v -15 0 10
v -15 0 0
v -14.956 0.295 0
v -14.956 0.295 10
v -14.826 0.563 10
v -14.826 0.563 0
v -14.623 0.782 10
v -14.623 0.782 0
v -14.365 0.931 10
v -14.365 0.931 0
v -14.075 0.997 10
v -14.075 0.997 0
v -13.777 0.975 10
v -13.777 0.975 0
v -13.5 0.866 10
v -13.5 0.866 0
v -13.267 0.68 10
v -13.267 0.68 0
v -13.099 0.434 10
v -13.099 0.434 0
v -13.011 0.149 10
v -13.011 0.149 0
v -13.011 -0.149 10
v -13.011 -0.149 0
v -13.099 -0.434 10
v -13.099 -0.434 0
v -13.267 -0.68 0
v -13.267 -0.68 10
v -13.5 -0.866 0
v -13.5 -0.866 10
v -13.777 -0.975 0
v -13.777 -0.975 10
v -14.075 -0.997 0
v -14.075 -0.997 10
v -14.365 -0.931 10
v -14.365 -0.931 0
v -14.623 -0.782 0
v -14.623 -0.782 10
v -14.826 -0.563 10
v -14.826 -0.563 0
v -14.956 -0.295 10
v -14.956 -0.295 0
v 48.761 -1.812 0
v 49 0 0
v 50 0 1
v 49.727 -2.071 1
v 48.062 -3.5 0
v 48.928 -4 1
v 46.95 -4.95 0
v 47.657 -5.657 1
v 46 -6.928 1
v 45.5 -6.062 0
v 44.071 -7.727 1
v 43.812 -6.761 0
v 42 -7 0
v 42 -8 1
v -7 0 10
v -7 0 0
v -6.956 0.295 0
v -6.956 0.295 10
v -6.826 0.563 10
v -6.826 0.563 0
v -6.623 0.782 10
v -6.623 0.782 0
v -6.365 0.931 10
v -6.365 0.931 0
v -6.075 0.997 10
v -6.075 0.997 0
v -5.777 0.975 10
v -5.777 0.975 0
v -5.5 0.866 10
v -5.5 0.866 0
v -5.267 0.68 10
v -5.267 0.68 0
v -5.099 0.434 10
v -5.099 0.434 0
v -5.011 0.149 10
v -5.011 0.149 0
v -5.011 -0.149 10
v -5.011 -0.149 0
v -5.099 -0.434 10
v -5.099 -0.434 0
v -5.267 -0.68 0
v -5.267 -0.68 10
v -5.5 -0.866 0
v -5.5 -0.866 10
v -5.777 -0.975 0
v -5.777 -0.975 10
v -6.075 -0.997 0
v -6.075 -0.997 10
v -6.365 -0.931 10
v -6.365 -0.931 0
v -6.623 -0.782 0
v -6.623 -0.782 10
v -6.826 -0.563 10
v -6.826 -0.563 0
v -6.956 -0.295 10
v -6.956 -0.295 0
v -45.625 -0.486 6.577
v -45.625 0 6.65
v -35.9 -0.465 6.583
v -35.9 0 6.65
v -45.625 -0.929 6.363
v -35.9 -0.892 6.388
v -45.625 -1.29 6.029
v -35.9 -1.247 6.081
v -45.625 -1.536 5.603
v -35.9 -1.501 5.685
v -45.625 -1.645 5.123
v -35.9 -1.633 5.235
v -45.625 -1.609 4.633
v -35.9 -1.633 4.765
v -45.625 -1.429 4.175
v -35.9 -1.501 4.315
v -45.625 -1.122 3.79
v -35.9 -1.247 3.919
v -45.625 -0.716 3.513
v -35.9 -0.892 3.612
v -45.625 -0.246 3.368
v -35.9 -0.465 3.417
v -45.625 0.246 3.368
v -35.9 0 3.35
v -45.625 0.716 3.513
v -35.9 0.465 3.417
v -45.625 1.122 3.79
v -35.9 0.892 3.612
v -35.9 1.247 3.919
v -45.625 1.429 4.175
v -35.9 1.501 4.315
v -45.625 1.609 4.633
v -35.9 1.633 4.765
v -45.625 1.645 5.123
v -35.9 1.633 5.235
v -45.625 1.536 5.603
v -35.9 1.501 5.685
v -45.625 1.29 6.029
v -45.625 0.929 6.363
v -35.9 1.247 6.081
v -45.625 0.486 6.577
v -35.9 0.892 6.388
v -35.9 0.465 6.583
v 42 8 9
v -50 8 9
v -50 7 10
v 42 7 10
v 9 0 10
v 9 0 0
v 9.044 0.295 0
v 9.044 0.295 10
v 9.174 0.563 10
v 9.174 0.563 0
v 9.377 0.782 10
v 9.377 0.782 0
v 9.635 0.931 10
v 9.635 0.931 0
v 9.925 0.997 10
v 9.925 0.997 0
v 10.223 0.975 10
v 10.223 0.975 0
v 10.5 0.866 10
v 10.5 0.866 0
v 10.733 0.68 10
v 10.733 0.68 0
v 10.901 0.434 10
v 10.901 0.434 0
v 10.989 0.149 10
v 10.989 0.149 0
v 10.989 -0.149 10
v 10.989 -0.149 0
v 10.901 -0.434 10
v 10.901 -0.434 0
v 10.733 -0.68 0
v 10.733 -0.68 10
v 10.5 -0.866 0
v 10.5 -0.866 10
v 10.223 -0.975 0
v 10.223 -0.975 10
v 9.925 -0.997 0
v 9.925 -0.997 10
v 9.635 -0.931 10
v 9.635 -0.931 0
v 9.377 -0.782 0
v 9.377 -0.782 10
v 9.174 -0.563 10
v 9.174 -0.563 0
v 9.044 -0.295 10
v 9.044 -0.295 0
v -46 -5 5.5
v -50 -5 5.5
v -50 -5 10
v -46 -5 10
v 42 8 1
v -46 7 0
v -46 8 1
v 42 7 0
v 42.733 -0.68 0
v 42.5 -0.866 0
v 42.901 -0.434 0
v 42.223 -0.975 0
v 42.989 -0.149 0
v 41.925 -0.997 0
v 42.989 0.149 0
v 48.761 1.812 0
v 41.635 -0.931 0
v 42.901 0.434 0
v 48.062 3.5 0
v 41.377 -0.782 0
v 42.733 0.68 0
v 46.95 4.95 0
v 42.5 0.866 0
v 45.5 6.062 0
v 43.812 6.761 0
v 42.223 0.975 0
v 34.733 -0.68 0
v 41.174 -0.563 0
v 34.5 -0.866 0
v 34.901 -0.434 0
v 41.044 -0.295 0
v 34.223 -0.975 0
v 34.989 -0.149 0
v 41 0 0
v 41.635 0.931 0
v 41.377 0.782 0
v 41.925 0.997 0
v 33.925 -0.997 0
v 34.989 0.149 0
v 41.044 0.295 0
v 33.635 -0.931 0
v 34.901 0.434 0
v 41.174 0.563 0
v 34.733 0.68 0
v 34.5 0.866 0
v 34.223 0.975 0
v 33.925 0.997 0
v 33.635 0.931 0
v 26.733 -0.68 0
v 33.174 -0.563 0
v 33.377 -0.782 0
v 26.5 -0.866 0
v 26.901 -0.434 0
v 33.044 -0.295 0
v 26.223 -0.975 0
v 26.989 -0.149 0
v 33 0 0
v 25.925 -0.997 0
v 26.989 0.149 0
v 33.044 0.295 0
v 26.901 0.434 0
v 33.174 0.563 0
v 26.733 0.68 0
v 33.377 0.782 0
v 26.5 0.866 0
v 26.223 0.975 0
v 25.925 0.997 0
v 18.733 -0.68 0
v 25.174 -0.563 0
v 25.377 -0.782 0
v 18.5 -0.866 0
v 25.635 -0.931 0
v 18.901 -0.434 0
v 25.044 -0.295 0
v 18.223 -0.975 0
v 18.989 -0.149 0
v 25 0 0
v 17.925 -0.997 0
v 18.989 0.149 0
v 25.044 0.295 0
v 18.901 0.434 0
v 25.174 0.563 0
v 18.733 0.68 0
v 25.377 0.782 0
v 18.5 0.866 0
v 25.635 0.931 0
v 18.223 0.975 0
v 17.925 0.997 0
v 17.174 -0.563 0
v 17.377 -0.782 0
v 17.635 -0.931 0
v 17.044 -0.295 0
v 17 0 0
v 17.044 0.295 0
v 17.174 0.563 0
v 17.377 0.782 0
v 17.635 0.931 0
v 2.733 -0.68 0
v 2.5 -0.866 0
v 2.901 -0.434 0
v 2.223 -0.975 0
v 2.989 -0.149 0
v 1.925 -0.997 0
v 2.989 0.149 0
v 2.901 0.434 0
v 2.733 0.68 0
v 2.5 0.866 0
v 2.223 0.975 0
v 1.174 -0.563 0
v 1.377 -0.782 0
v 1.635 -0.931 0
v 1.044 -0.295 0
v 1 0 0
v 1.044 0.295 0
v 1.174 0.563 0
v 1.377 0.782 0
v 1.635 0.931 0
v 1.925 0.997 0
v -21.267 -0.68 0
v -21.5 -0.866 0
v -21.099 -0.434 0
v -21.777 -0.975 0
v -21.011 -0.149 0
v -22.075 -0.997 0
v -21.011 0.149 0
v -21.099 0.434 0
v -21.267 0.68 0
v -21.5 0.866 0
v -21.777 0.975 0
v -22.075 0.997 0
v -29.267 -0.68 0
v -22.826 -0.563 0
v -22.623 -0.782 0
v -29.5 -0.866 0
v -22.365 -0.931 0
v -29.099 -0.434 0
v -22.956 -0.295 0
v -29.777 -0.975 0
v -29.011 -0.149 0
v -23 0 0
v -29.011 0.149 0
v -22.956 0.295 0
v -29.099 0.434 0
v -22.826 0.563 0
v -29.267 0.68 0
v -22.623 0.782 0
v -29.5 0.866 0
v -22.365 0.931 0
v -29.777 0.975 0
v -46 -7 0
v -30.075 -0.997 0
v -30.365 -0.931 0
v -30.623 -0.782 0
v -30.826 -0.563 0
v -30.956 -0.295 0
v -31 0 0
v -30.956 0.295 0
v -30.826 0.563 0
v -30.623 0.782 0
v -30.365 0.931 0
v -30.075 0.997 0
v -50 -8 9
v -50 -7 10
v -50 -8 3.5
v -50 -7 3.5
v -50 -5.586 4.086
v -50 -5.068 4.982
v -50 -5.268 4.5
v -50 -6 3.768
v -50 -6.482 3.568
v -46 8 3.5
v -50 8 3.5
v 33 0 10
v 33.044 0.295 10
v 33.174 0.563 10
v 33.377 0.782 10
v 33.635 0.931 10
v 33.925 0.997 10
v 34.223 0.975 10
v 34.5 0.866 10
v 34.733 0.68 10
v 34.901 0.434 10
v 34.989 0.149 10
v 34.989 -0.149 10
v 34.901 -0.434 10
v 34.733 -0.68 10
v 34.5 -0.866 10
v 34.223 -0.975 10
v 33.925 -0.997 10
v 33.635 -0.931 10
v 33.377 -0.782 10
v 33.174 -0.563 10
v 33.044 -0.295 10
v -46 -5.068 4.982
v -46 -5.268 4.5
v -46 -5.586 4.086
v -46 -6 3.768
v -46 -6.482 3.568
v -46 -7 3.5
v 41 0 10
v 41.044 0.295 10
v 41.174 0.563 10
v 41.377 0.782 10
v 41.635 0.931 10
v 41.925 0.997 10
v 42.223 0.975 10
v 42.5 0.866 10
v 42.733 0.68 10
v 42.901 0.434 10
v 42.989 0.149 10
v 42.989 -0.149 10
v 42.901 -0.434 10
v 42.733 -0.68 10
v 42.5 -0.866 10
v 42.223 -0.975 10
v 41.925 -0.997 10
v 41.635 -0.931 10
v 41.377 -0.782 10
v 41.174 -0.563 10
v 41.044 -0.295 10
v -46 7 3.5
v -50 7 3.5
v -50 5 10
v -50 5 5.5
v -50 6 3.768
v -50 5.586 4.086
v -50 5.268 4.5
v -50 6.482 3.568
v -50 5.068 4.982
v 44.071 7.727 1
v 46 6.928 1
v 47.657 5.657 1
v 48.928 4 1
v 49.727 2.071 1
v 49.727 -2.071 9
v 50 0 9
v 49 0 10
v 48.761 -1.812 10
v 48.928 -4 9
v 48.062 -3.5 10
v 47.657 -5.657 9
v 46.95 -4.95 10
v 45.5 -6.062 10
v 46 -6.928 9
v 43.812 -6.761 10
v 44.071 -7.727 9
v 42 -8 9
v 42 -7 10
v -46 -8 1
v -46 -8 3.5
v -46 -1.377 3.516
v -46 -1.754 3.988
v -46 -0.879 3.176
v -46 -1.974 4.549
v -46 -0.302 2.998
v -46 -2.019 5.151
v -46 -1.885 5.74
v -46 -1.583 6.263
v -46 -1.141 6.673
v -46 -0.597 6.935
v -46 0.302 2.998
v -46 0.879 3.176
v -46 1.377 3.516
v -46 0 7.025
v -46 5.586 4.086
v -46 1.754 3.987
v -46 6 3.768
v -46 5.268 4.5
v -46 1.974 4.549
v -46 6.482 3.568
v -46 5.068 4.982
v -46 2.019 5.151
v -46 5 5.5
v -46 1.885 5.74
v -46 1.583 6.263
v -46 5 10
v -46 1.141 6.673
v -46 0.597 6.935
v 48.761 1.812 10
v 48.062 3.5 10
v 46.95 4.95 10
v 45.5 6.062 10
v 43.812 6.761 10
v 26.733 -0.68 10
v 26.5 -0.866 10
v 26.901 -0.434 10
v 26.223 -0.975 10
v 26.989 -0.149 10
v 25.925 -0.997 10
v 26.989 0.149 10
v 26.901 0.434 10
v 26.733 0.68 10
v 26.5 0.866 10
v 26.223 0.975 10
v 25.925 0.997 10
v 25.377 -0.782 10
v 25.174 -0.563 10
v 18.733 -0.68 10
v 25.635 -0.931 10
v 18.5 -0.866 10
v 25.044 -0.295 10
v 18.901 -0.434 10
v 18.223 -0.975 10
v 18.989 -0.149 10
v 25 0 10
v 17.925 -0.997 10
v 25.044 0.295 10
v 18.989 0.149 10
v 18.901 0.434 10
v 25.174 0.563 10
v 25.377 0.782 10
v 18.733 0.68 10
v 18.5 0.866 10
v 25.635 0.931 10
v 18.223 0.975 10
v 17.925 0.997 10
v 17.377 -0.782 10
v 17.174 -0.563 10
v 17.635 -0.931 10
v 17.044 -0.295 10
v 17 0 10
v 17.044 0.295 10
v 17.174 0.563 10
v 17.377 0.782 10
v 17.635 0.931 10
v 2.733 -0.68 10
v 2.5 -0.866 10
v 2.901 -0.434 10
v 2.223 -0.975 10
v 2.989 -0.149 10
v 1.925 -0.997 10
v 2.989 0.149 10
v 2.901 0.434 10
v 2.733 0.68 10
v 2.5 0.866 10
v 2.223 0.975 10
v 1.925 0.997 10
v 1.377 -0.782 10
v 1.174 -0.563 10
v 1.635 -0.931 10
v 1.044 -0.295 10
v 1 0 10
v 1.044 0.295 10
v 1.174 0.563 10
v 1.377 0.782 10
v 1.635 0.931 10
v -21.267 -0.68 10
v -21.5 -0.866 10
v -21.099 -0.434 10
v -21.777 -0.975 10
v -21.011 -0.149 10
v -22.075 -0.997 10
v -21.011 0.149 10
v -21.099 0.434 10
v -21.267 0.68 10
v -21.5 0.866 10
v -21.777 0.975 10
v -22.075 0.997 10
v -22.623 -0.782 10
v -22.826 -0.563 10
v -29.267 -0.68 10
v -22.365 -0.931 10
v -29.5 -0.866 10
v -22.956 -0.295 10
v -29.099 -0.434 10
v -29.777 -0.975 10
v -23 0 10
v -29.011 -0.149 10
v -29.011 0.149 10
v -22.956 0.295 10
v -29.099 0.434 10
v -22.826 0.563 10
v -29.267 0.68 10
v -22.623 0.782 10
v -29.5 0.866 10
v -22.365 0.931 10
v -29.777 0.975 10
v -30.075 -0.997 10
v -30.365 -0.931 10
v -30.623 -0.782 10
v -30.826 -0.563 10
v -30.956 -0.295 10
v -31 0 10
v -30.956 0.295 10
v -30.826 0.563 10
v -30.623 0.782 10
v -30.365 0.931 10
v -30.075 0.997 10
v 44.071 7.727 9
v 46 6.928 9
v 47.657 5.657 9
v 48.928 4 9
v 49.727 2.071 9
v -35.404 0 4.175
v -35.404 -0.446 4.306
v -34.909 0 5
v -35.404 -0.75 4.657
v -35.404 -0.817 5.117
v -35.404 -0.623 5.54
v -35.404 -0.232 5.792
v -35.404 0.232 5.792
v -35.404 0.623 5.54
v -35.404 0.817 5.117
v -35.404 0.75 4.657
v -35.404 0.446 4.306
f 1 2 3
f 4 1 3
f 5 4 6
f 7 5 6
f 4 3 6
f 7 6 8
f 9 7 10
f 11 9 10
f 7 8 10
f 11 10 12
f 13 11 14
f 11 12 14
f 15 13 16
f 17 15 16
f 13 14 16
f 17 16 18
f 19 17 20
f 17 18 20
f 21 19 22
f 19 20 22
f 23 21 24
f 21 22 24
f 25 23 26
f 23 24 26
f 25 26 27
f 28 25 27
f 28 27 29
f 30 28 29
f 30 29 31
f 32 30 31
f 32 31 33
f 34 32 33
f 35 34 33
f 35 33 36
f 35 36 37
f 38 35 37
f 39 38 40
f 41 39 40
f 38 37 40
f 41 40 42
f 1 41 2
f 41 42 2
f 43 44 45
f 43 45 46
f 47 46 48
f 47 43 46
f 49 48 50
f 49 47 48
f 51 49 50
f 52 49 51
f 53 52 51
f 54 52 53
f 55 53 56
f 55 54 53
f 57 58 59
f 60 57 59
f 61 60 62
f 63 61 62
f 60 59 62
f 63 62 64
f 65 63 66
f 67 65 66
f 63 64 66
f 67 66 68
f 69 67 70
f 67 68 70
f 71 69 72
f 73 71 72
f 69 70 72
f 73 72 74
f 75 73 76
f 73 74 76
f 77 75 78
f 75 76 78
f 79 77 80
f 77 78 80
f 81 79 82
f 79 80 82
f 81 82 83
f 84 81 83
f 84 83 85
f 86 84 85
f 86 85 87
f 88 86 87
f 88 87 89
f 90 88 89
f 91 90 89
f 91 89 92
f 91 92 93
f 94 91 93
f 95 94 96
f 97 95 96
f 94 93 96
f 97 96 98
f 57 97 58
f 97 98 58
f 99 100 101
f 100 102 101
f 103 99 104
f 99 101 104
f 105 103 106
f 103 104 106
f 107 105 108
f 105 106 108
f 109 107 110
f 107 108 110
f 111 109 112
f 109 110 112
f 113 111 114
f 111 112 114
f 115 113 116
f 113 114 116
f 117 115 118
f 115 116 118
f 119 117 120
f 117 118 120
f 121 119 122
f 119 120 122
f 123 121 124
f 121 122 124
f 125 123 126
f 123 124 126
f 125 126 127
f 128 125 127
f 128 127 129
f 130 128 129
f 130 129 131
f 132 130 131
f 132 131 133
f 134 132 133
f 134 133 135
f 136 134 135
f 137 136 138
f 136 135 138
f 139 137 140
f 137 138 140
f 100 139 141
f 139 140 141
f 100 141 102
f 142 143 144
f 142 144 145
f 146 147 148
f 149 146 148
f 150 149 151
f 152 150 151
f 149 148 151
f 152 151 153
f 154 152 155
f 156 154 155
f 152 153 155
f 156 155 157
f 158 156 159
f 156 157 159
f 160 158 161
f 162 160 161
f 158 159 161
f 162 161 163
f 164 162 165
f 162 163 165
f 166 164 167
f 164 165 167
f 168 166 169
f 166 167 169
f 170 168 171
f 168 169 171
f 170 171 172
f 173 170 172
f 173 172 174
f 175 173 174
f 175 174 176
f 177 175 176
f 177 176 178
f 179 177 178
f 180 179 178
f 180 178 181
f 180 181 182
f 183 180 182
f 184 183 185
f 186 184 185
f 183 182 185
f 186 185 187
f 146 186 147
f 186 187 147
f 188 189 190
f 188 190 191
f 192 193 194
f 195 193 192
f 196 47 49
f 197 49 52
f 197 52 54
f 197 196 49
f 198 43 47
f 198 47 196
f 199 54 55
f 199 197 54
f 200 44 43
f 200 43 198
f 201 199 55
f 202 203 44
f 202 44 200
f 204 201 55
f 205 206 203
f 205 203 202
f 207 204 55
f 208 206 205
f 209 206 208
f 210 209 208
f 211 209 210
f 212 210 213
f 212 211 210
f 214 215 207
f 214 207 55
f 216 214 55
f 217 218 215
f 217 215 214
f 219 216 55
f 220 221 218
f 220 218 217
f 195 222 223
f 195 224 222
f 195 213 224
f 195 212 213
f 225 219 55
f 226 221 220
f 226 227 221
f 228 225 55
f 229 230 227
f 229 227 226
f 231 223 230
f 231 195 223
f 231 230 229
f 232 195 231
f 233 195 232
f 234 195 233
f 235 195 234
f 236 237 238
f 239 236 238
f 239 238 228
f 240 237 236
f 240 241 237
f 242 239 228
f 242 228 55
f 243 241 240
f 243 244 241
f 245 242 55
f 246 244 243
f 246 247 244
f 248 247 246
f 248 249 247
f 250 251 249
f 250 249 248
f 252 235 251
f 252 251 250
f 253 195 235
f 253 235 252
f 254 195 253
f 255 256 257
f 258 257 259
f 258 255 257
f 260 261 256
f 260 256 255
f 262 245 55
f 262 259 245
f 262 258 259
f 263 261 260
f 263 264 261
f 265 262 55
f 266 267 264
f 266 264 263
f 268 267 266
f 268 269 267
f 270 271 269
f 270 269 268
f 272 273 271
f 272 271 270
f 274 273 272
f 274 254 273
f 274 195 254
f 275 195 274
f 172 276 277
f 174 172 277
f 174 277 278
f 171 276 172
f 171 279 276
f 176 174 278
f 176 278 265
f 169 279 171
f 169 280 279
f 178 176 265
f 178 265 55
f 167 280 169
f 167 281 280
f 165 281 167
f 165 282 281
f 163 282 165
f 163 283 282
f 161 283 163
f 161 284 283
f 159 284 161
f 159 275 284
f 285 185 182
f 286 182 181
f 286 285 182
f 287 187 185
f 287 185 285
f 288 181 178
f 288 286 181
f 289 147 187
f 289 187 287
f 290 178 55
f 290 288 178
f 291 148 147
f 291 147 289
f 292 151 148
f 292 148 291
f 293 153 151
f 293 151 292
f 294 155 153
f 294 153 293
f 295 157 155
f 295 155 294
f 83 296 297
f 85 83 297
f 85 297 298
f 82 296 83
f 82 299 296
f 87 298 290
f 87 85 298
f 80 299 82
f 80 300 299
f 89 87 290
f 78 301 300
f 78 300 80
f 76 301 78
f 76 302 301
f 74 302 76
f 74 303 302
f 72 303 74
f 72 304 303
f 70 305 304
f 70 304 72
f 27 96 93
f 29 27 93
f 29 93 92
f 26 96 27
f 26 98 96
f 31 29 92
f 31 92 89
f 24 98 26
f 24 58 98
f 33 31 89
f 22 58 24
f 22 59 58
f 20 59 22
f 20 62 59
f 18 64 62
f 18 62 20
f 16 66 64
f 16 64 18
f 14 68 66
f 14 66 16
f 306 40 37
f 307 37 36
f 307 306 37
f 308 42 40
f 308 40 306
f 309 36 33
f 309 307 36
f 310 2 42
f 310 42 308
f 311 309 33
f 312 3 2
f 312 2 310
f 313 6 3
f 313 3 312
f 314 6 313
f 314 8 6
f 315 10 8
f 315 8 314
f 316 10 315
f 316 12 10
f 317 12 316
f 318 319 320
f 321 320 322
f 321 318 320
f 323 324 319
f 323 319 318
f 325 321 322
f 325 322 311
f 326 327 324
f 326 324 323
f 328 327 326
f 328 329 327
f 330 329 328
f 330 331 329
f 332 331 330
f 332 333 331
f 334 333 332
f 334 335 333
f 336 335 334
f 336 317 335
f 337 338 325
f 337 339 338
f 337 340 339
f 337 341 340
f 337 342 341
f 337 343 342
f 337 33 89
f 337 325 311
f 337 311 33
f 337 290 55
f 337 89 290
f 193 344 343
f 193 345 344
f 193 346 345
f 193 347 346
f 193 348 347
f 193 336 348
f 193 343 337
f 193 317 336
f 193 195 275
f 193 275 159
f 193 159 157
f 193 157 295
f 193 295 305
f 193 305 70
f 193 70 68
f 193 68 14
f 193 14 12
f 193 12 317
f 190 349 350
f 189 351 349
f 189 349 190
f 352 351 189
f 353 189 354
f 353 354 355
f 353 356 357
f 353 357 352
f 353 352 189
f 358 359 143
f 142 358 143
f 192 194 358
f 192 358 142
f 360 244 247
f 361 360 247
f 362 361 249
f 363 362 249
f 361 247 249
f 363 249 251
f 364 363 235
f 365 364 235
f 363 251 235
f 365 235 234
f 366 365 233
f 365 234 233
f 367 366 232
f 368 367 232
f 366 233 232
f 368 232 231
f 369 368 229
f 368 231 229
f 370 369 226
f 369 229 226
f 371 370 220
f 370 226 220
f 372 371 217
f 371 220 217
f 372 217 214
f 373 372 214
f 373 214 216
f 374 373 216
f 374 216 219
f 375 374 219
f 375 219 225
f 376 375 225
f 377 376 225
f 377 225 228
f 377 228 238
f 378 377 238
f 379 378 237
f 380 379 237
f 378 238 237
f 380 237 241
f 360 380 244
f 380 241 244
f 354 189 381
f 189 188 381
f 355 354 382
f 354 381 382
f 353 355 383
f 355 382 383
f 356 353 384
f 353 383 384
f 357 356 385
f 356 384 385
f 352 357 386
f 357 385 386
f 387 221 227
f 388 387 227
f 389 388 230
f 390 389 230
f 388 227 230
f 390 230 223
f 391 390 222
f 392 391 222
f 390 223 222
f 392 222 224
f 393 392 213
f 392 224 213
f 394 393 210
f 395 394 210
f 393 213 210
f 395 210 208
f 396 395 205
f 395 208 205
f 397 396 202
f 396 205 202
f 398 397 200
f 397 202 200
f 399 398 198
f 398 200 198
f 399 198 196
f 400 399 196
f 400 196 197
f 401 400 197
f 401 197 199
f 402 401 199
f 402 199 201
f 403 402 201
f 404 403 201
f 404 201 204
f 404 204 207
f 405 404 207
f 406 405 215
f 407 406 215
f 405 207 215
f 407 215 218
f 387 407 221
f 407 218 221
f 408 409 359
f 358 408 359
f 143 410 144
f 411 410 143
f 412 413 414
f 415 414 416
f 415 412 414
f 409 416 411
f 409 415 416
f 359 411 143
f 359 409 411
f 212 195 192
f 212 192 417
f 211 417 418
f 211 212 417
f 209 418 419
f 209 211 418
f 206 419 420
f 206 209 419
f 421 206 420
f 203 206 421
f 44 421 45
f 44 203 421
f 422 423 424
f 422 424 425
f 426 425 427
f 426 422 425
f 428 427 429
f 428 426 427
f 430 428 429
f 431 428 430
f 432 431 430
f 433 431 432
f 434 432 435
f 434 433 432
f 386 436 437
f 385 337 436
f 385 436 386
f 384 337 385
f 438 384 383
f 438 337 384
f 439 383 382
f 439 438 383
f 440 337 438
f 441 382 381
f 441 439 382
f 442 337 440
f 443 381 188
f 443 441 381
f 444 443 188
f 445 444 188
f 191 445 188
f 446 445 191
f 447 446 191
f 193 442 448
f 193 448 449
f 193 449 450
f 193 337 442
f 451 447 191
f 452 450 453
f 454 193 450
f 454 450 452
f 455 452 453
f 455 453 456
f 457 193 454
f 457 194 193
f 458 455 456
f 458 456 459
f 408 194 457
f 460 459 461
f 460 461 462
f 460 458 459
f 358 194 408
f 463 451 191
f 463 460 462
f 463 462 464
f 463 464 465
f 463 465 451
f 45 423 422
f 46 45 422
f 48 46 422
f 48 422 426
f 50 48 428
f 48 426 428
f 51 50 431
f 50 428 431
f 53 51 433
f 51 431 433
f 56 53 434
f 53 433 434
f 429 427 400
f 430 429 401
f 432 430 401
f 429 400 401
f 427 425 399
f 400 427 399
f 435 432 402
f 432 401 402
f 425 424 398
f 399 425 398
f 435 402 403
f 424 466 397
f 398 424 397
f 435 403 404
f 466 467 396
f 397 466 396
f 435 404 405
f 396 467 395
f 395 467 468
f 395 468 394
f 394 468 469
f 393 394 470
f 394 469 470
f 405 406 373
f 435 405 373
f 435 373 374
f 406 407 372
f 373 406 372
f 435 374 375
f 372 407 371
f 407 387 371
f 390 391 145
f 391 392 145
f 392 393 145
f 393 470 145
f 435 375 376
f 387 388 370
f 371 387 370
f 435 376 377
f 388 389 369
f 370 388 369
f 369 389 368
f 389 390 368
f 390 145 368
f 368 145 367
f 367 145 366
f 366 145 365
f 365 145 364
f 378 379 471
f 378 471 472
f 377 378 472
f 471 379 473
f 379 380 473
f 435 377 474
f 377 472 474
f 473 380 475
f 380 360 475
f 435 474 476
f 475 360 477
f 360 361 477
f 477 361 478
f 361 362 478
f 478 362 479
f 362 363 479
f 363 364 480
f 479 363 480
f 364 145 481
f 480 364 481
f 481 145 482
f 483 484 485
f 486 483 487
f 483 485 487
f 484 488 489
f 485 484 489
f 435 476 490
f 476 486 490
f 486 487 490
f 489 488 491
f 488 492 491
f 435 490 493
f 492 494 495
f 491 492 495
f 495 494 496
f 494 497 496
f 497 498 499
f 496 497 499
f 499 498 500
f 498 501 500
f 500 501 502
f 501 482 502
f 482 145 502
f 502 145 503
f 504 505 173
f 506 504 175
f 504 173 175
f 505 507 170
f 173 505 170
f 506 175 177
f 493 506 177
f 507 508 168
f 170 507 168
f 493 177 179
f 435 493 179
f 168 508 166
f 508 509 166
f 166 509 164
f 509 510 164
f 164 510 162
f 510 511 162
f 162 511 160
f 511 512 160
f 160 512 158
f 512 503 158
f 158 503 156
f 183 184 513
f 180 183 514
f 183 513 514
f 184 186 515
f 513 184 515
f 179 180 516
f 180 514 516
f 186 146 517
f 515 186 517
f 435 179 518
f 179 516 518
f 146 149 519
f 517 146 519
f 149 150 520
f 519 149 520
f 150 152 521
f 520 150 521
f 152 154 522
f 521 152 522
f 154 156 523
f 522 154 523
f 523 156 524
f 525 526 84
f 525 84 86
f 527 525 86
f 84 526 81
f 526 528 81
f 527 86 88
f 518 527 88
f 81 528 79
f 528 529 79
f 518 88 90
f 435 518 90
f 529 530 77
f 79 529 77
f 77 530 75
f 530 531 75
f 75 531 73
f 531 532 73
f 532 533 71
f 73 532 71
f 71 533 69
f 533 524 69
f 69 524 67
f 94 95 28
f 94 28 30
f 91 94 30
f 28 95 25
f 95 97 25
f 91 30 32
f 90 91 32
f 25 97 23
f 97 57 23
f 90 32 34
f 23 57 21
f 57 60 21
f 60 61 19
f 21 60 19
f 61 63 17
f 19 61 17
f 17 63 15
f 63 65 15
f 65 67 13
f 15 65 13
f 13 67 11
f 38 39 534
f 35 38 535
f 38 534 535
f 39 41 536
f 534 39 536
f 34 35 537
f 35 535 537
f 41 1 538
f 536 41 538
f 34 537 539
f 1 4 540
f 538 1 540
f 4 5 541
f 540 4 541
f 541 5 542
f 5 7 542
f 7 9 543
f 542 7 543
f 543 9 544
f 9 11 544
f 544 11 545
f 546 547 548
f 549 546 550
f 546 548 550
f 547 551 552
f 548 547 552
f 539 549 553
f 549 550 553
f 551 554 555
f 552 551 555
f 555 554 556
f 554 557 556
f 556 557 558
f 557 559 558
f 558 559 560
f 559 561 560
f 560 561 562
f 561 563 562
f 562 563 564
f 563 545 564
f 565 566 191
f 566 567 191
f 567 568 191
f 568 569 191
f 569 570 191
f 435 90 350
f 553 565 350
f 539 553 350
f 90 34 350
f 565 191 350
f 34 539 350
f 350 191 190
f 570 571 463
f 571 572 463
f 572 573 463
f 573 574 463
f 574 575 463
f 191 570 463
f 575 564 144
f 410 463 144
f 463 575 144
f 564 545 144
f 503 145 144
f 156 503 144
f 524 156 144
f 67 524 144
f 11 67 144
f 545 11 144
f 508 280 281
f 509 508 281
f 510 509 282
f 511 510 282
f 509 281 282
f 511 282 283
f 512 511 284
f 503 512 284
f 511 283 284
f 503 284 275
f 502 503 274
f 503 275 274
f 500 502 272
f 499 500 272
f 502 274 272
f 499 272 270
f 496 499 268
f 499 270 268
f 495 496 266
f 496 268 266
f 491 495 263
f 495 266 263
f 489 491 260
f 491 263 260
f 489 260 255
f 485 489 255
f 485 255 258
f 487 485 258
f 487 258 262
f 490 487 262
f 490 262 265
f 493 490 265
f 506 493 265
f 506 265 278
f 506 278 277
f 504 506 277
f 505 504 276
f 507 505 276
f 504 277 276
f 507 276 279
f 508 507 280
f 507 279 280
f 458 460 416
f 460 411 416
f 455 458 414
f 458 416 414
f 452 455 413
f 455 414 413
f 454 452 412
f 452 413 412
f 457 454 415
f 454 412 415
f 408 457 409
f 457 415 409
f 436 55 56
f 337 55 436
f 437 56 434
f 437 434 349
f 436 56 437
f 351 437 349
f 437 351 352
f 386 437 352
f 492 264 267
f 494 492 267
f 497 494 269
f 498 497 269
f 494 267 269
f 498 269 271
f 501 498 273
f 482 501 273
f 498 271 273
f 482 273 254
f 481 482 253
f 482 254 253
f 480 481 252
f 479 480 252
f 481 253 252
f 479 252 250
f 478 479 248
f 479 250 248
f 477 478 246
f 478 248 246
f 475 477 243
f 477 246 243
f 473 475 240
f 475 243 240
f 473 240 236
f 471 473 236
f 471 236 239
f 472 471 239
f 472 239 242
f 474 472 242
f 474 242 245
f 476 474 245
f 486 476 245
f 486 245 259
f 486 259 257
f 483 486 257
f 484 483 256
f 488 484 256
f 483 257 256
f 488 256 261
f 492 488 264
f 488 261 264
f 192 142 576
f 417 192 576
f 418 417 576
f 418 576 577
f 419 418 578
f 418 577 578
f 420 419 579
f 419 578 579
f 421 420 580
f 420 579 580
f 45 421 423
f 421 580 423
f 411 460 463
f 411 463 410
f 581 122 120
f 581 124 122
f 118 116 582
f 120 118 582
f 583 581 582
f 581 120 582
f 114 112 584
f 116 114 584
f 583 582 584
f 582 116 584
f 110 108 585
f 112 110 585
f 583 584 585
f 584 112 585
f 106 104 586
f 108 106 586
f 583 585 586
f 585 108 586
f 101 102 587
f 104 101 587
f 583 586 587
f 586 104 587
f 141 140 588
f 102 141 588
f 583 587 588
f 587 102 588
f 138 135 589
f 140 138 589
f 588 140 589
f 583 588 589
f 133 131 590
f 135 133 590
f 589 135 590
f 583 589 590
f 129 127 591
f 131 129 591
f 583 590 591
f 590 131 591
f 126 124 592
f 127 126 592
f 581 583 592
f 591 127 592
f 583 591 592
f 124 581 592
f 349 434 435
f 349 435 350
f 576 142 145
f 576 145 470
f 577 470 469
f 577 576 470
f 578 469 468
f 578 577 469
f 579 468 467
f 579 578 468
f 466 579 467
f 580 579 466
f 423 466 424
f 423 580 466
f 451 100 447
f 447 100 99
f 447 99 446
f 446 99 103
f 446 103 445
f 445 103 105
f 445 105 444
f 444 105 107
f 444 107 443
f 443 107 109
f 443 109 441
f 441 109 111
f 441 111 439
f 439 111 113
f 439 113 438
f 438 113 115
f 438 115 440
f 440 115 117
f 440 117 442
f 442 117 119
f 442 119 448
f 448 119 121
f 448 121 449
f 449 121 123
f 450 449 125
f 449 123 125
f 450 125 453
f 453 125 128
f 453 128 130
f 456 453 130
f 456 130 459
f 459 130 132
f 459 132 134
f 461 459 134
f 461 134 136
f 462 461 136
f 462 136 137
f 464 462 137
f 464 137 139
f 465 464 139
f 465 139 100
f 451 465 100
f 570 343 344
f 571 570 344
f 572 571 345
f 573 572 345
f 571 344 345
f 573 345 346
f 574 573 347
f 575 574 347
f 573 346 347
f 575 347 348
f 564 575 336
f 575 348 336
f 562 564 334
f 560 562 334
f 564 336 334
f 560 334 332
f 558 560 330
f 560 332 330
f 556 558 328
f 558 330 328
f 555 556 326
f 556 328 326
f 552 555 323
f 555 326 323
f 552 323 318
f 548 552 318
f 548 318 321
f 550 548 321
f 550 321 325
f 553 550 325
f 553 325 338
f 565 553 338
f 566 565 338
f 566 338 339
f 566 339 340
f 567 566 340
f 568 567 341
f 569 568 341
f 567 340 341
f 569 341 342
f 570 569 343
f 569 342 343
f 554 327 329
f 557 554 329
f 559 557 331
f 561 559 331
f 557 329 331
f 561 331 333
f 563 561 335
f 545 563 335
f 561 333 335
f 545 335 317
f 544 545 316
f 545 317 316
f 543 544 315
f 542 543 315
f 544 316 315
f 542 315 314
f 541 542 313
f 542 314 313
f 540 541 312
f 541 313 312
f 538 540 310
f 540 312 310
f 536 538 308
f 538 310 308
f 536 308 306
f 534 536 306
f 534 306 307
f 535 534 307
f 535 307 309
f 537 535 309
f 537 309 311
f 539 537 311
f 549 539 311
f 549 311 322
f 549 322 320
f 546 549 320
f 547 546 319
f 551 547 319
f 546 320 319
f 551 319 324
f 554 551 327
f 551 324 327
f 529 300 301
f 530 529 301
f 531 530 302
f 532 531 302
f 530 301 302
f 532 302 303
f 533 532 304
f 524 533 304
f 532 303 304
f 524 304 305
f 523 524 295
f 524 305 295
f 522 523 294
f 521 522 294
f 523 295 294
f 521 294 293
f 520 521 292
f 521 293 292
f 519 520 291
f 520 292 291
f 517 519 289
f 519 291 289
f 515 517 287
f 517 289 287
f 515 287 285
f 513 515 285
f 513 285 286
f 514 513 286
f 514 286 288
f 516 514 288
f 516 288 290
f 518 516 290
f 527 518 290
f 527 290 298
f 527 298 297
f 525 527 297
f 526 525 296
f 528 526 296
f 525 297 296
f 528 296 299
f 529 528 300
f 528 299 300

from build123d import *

# Parameters (mm, degrees)
BOSS_EXTRUDE1_DEPTH         = 10
M4_TAPPED_HOLE1_D           = 3.3
M4_TAPPED_HOLE1_DEPTH       = 10.1
M4_TAPPED_HOLE1_CSINK_D     = 4.05
M4_TAPPED_HOLE1_CSINK_ANGLE = 90
M4_TAPPED_HOLE1_TIP         = 0.991420021
FILLET1_R                   = 8
CHAMFER1_SIZE               = 1
SKETCH4_R                   = 1
CUT_EXTRUDE1_DEPTH          = 10
SKETCH6_W                   = 3.5
SKETCH6_H                   = 16
CUT_EXTRUDE3_DEPTH          = 4
FILLET3_R                   = 2


with BuildPart() as part:
    # Sketch1 → Boss-Extrude1 (new body)
    with BuildSketch(Plane.XY):
        Polygon((-50, 8), (50, 8), (50, -8), (-50, -8), (-50, -5), (-46, -5), (-46, 5), (-50, 5), align=None)
    extrude(amount=BOSS_EXTRUDE1_DEPTH)

    # M4 Tapped Hole1
    with Locations(Plane(origin=(-46, 0, 5), x_dir=(0, 0, -1), z_dir=(-1, 0, 0))):
        with Locations((0, 0)):
            CounterSinkHole(M4_TAPPED_HOLE1_D / 2, M4_TAPPED_HOLE1_CSINK_D / 2, depth=M4_TAPPED_HOLE1_DEPTH, counter_sink_angle=M4_TAPPED_HOLE1_CSINK_ANGLE)
            with Locations((0, 0, -(M4_TAPPED_HOLE1_DEPTH + M4_TAPPED_HOLE1_TIP / 2))):  # 118° drill point
                Cone(0, M4_TAPPED_HOLE1_D / 2, M4_TAPPED_HOLE1_TIP, mode=Mode.SUBTRACT)

    # Fillet1
    fillet1_edges = [part.edges().sort_by_distance(p)[0] for p in [
        (50, 8, 5),
        (50, -8, 5),
    ]]
    fillet(fillet1_edges, radius=FILLET1_R - 0.0001)  # a hair under: the kernel refuses the full size

    # Chamfer1
    chamfer1_edges = [part.edges().sort_by_distance(p)[0] for p in [
        (-3.99995, -8, 10),
        (-3.99995, 8, 0),
        (-3.99995, 8, 10),
        (47.656883539, -5.656883539, 0),
        (47.656883539, 5.656883539, 0),
        (47.656883539, -5.656883539, 10),
        (47.656883539, 5.656883539, 10),
        (-3.99995, -8, 0),
    ]]
    chamfer(chamfer1_edges, length=CHAMFER1_SIZE)

    # Sketch4 → Cut-Extrude1 (cut)
    with BuildSketch(Plane(origin=(0, 0, 0), x_dir=(-1, 0, 0), z_dir=(0, 0, -1))):
        with Locations((-42, 0)):
            Circle(SKETCH4_R)
        with Locations((-34, 0)):
            Circle(SKETCH4_R)
        with Locations((-26, 0)):
            Circle(SKETCH4_R)
        with Locations((-18, 0)):
            Circle(SKETCH4_R)
        with Locations((-10, 0)):
            Circle(SKETCH4_R)
        with Locations((-2, 0)):
            Circle(SKETCH4_R)
        with Locations((6, 0)):
            Circle(SKETCH4_R)
        with Locations((14, 0)):
            Circle(SKETCH4_R)
        with Locations((22, 0)):
            Circle(SKETCH4_R)
        with Locations((30, 0)):
            Circle(SKETCH4_R)
    extrude(amount=-CUT_EXTRUDE1_DEPTH, mode=Mode.SUBTRACT)

    # Sketch6 → Cut-Extrude3 (cut)
    with BuildSketch(Plane.ZY.offset(50)):
        with Locations((1.75, 0)):
            Rectangle(SKETCH6_W, SKETCH6_H)
    extrude(amount=-CUT_EXTRUDE3_DEPTH, mode=Mode.SUBTRACT)

    # Fillet3
    fillet3_edges = [part.edges().sort_by_distance(p)[0] for p in [
        (-48, 5, 3.5),
        (-48, -5, 3.5),
    ]]
    fillet(fillet3_edges, radius=FILLET3_R)


solid = part.part
